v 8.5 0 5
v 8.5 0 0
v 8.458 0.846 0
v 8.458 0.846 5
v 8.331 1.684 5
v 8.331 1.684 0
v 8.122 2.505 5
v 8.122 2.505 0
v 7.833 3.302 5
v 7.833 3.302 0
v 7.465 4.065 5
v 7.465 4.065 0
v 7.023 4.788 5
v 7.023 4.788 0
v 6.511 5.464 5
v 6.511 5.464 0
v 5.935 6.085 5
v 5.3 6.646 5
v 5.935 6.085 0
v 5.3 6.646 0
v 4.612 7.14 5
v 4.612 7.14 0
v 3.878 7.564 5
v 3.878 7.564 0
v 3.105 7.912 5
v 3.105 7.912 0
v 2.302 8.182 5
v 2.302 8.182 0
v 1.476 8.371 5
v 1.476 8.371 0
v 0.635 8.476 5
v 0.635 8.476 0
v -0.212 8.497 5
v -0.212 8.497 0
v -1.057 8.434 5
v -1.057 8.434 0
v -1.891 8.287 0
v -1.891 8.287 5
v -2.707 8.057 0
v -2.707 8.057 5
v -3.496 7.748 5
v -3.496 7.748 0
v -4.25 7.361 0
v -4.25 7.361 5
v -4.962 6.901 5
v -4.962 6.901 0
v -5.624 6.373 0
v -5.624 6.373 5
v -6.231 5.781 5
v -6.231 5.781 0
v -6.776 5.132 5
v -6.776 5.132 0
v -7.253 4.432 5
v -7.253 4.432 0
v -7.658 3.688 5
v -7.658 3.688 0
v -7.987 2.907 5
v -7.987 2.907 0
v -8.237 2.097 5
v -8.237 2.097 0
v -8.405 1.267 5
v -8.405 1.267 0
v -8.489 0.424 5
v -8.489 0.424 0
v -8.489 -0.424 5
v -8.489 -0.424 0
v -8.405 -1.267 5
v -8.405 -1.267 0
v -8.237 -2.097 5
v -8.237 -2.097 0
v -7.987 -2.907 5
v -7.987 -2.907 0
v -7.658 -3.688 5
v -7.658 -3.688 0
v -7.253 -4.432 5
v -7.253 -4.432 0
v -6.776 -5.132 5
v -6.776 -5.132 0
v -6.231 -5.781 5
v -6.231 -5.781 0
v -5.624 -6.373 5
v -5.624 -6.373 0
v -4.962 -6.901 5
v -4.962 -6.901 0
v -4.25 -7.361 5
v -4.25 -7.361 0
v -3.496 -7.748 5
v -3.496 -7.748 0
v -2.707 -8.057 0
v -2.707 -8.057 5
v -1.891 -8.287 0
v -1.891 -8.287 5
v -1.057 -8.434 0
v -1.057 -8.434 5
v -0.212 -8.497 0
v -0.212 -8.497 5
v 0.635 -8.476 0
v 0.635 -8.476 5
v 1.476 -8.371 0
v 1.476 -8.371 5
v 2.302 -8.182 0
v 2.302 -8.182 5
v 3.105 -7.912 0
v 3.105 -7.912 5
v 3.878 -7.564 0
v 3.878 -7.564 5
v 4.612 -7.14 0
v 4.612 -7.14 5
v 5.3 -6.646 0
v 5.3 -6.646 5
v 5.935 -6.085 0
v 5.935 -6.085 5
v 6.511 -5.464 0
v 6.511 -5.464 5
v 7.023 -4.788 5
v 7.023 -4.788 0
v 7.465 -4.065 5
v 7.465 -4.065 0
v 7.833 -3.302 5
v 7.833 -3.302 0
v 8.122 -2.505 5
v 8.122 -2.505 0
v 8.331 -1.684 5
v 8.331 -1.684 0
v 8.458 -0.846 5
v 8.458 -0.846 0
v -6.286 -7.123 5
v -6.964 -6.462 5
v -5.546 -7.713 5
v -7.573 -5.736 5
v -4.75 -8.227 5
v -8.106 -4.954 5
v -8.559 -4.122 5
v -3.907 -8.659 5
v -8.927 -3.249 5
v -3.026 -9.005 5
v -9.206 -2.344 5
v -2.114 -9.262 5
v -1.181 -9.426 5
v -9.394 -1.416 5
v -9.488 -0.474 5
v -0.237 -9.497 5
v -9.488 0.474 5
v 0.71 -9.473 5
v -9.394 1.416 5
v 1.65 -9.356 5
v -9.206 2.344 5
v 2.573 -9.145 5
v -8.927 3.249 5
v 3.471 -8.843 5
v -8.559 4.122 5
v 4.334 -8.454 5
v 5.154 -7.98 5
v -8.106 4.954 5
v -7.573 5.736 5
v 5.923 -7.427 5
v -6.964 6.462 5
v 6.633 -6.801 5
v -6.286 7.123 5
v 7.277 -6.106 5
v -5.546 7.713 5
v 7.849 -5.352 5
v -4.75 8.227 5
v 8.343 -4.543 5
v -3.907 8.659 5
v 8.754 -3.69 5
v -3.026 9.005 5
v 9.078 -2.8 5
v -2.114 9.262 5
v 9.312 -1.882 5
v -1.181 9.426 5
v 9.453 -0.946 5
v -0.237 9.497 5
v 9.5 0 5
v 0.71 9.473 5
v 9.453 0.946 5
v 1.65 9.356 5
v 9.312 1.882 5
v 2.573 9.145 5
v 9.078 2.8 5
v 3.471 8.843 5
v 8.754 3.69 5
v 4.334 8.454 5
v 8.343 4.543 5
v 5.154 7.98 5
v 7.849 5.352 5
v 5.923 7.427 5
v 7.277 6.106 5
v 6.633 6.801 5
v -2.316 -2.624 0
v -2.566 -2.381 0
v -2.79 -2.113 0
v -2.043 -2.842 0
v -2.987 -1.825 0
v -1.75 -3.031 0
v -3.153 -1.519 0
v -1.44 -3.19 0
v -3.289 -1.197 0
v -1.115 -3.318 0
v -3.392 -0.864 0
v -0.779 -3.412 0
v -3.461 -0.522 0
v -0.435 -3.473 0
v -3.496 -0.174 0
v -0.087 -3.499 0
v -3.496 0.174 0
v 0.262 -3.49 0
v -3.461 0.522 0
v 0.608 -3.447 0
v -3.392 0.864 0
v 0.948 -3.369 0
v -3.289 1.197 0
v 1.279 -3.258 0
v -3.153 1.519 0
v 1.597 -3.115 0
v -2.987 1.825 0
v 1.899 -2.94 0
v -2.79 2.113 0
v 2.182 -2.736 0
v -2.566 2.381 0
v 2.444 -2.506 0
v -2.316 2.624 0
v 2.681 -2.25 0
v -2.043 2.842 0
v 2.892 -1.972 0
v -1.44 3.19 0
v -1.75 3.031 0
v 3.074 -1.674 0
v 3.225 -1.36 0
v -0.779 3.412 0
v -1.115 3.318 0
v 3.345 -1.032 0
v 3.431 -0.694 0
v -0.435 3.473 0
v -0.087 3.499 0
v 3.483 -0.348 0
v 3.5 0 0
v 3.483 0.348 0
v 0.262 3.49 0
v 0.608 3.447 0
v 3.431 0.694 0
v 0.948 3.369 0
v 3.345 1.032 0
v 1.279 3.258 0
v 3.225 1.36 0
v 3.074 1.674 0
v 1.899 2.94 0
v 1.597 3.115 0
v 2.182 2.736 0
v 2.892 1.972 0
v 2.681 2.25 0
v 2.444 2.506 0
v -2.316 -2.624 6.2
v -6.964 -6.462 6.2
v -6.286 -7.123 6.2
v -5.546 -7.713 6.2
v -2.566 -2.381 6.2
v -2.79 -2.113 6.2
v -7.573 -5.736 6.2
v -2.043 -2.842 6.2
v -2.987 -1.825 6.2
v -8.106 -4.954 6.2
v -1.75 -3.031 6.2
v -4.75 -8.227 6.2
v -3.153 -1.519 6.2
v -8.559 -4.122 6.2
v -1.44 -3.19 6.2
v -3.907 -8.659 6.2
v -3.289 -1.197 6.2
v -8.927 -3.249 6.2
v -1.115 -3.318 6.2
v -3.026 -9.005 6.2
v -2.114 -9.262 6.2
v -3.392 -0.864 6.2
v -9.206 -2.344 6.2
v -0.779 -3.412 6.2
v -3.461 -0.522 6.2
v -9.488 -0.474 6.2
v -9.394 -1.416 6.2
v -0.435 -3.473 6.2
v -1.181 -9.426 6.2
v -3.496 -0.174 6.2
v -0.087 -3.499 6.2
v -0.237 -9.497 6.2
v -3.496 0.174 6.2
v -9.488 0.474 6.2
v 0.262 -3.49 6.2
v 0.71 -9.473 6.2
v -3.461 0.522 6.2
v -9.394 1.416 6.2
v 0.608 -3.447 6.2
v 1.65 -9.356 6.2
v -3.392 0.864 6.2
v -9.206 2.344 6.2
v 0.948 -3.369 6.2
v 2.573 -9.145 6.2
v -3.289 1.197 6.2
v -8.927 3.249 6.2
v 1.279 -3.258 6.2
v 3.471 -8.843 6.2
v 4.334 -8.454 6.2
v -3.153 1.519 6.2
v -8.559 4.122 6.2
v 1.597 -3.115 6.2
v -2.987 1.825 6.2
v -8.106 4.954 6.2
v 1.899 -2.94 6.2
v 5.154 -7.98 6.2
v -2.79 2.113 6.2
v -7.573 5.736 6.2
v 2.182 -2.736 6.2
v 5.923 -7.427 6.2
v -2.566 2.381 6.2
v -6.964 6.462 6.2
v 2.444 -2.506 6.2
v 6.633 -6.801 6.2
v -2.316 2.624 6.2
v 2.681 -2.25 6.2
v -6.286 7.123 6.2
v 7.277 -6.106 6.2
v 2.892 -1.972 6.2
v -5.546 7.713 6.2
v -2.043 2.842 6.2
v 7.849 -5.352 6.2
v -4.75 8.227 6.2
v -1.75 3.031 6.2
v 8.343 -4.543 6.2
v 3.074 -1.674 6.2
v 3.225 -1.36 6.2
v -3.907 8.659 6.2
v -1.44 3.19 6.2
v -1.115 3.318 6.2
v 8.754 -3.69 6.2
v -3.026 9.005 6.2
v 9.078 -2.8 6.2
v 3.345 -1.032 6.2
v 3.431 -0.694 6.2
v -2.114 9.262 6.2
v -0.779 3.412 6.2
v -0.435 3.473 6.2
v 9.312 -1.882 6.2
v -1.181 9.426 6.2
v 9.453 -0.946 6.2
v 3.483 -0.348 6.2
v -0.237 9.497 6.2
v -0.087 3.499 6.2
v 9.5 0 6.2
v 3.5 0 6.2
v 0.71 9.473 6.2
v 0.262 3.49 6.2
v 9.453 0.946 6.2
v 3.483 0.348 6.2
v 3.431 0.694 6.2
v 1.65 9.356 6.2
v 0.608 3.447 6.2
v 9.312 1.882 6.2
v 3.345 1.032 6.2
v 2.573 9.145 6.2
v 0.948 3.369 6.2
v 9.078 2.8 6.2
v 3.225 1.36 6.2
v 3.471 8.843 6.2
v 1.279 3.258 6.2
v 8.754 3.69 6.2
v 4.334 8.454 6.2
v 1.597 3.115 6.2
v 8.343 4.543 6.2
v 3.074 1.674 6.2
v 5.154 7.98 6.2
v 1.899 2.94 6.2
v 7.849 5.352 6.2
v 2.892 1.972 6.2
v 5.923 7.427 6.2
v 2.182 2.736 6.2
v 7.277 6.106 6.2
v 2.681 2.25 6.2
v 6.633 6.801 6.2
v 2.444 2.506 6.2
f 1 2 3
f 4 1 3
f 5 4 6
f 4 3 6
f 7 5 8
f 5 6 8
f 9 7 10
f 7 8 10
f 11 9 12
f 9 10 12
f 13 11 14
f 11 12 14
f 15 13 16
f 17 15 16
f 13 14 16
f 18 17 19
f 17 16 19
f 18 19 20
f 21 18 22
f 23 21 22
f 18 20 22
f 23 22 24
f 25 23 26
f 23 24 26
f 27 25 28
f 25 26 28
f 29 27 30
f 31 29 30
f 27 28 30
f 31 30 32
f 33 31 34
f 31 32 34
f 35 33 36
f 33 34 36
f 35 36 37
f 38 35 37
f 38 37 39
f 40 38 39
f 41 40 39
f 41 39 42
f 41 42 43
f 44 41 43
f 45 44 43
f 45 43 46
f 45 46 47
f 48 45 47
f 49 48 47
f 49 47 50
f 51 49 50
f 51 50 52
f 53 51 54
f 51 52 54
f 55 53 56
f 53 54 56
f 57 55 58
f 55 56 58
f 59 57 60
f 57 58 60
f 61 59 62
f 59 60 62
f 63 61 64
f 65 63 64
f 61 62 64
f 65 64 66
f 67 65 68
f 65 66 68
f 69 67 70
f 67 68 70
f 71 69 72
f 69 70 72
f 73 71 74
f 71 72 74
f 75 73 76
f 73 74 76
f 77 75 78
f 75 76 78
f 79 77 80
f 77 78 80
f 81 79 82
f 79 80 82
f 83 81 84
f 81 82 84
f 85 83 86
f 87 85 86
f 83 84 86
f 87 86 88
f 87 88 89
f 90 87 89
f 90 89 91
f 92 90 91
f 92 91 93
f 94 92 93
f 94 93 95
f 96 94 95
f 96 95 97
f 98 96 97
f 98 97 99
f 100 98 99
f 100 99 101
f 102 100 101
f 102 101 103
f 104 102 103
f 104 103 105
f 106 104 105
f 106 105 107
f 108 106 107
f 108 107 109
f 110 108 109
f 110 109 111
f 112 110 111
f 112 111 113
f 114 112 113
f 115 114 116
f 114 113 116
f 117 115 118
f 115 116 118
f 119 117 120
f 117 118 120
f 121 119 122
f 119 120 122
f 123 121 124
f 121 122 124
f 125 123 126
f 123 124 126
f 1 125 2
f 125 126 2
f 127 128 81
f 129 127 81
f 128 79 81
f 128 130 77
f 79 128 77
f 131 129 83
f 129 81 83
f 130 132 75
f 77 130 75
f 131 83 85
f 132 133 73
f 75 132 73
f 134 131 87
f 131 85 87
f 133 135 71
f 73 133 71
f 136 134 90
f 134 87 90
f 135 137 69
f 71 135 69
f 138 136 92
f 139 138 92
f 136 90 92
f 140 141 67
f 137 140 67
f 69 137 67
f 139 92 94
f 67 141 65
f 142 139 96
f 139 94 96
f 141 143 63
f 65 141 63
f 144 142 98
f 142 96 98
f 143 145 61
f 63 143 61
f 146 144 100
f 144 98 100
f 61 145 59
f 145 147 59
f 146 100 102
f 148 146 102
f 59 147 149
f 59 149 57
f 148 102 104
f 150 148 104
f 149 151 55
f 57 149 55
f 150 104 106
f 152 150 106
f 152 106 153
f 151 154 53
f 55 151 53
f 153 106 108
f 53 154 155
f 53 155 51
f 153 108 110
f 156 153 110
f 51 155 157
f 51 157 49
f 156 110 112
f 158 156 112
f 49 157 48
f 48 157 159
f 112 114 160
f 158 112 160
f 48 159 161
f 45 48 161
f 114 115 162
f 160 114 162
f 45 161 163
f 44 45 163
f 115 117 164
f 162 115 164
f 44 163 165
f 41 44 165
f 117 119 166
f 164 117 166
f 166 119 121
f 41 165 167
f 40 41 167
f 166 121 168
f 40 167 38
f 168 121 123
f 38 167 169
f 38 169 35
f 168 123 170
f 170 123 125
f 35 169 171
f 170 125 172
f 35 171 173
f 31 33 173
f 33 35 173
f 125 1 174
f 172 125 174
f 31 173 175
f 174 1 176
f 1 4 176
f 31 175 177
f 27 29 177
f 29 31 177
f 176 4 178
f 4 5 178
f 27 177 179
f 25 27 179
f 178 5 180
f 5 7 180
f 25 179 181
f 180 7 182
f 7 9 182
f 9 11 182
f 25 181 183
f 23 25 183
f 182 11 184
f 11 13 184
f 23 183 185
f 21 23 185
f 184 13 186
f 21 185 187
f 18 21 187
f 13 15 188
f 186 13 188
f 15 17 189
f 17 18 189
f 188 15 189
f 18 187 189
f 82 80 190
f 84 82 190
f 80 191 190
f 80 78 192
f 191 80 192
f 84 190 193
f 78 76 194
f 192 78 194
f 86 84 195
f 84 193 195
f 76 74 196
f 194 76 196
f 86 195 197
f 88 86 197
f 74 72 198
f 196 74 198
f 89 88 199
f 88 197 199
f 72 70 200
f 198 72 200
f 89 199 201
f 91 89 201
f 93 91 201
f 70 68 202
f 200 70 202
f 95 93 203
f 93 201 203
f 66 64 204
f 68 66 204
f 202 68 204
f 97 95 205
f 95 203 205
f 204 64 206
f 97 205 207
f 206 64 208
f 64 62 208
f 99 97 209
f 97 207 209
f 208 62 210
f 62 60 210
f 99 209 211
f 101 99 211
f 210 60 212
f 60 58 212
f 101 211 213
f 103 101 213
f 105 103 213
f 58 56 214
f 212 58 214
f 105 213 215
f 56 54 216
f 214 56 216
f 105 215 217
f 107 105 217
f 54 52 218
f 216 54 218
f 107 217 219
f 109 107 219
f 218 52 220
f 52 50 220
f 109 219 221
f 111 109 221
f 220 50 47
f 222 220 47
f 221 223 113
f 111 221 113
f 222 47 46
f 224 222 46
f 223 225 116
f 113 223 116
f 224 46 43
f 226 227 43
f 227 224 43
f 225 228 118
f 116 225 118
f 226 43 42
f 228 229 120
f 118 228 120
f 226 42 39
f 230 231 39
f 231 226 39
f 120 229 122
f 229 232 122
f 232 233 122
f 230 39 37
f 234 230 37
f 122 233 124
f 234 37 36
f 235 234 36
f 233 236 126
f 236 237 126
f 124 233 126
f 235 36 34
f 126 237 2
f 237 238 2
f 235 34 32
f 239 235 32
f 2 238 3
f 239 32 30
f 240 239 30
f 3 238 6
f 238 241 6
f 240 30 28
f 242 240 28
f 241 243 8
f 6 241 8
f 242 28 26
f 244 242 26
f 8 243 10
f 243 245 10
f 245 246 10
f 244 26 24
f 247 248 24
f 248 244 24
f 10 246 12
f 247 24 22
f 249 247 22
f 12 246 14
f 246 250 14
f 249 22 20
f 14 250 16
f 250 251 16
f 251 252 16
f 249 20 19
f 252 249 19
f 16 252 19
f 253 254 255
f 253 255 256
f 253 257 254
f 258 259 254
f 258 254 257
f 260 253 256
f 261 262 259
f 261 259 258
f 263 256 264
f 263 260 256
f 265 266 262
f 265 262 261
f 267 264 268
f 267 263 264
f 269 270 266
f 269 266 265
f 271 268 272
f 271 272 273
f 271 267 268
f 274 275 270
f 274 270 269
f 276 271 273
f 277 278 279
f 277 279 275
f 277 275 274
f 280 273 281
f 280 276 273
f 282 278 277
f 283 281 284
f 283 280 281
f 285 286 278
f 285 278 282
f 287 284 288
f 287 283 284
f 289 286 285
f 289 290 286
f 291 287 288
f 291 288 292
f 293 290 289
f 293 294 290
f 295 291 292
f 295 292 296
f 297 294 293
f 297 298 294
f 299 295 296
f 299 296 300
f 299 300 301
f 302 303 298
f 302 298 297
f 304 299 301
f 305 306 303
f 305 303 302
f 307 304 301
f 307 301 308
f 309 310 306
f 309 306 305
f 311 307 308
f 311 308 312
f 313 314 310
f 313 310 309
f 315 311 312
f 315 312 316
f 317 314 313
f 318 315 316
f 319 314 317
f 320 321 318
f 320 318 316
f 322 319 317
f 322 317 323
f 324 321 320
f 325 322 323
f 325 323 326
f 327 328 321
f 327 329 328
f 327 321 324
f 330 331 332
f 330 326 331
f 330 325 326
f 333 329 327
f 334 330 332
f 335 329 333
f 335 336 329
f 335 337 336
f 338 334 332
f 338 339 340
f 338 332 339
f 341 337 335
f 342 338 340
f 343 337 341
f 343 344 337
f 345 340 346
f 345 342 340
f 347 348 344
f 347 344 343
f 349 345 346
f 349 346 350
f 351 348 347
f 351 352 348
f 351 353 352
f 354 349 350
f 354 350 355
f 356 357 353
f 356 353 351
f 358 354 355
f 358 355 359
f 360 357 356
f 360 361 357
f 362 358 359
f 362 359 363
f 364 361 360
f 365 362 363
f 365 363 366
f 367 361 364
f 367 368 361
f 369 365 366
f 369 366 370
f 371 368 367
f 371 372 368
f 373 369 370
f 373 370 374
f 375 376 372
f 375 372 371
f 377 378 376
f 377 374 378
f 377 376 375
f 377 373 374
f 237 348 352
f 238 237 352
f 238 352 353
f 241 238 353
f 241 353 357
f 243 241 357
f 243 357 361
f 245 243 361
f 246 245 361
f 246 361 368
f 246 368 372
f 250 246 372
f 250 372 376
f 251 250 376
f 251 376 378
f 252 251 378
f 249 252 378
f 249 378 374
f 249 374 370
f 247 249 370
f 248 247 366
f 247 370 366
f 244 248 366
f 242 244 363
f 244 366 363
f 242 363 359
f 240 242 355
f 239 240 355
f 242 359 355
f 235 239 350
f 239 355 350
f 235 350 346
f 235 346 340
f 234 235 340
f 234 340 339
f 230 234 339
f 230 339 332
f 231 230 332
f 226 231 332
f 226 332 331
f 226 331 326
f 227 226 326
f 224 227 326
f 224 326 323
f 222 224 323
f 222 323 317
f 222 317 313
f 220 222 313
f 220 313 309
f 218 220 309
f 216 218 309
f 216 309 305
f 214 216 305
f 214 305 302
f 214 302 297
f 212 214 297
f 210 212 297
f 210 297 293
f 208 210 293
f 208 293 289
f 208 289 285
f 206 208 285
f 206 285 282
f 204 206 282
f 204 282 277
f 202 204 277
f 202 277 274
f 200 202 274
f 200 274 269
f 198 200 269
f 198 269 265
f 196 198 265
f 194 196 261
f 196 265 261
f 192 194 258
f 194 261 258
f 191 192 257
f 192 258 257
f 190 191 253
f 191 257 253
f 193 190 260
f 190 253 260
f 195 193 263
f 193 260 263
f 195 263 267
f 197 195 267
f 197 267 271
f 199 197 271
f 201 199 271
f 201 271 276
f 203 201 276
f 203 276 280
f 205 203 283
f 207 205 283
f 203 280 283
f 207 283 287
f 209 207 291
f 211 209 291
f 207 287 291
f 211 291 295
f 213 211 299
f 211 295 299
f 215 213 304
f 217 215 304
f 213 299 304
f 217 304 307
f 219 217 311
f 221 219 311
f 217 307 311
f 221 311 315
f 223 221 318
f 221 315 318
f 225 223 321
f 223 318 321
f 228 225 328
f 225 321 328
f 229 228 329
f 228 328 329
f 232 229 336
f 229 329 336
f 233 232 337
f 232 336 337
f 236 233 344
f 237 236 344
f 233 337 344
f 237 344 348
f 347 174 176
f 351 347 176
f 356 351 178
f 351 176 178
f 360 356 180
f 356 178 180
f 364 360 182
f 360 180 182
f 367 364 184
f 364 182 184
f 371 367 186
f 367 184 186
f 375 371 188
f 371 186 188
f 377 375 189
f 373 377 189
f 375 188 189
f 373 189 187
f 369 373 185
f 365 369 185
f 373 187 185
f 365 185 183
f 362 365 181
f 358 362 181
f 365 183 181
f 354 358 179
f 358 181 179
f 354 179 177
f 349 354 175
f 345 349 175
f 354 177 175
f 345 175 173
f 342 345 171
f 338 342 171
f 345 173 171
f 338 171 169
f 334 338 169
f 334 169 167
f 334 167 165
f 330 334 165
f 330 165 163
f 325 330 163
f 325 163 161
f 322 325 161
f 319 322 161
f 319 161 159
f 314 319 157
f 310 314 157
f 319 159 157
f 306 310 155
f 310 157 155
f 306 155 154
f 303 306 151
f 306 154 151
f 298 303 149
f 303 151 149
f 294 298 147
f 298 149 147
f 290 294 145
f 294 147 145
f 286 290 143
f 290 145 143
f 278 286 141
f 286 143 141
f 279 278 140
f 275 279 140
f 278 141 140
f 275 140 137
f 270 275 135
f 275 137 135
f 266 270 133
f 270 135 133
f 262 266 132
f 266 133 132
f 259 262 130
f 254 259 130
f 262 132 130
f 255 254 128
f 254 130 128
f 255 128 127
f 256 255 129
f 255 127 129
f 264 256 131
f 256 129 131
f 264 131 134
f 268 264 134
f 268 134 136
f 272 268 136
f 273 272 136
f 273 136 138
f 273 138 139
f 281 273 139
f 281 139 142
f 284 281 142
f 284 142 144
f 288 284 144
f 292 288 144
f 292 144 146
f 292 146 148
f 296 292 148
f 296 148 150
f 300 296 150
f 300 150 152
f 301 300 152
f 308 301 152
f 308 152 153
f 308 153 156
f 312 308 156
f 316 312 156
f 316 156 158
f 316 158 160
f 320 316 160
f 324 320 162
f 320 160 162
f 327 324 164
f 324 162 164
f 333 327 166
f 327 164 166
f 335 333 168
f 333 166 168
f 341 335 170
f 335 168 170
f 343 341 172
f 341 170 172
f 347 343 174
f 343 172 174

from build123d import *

# Parameters (mm, degrees)
SKETCH_1_R          = 8.5
EXTRUDE_1_DEPTH     = 5
SKETCH_2_R          = 9.5
EXTRUDE_2_DEPTH     = 1.2
CUT_EXTRUDE_1_REACH = 8.2
SKETCH_3_R          = 3.5


with BuildPart() as part:
    # 草圖1 → 填料-伸長1 (new body)
    with BuildSketch(Plane.XY):
        Circle(SKETCH_1_R)
    extrude(amount=EXTRUDE_1_DEPTH)

    # 草圖2 → 填料-伸長2 (add)
    with BuildSketch(Plane.XY.offset(5)):
        Circle(SKETCH_2_R)
    extrude(amount=EXTRUDE_2_DEPTH)

    # 草圖3 → 除料-伸長1 (cut, up to next)
    with BuildSketch(Plane.XY.offset(6.2), mode=Mode.PRIVATE) as cut_extrude_1_sk1:
        Circle(SKETCH_3_R)
    cut_extrude_1_tool1 = extrude(cut_extrude_1_sk1.sketch, amount=-CUT_EXTRUDE_1_REACH, mode=Mode.PRIVATE) & part.part
    add(cut_extrude_1_tool1.solids().sort_by_distance((0, 0, 6.2))[0], mode=Mode.SUBTRACT)


solid = part.part
